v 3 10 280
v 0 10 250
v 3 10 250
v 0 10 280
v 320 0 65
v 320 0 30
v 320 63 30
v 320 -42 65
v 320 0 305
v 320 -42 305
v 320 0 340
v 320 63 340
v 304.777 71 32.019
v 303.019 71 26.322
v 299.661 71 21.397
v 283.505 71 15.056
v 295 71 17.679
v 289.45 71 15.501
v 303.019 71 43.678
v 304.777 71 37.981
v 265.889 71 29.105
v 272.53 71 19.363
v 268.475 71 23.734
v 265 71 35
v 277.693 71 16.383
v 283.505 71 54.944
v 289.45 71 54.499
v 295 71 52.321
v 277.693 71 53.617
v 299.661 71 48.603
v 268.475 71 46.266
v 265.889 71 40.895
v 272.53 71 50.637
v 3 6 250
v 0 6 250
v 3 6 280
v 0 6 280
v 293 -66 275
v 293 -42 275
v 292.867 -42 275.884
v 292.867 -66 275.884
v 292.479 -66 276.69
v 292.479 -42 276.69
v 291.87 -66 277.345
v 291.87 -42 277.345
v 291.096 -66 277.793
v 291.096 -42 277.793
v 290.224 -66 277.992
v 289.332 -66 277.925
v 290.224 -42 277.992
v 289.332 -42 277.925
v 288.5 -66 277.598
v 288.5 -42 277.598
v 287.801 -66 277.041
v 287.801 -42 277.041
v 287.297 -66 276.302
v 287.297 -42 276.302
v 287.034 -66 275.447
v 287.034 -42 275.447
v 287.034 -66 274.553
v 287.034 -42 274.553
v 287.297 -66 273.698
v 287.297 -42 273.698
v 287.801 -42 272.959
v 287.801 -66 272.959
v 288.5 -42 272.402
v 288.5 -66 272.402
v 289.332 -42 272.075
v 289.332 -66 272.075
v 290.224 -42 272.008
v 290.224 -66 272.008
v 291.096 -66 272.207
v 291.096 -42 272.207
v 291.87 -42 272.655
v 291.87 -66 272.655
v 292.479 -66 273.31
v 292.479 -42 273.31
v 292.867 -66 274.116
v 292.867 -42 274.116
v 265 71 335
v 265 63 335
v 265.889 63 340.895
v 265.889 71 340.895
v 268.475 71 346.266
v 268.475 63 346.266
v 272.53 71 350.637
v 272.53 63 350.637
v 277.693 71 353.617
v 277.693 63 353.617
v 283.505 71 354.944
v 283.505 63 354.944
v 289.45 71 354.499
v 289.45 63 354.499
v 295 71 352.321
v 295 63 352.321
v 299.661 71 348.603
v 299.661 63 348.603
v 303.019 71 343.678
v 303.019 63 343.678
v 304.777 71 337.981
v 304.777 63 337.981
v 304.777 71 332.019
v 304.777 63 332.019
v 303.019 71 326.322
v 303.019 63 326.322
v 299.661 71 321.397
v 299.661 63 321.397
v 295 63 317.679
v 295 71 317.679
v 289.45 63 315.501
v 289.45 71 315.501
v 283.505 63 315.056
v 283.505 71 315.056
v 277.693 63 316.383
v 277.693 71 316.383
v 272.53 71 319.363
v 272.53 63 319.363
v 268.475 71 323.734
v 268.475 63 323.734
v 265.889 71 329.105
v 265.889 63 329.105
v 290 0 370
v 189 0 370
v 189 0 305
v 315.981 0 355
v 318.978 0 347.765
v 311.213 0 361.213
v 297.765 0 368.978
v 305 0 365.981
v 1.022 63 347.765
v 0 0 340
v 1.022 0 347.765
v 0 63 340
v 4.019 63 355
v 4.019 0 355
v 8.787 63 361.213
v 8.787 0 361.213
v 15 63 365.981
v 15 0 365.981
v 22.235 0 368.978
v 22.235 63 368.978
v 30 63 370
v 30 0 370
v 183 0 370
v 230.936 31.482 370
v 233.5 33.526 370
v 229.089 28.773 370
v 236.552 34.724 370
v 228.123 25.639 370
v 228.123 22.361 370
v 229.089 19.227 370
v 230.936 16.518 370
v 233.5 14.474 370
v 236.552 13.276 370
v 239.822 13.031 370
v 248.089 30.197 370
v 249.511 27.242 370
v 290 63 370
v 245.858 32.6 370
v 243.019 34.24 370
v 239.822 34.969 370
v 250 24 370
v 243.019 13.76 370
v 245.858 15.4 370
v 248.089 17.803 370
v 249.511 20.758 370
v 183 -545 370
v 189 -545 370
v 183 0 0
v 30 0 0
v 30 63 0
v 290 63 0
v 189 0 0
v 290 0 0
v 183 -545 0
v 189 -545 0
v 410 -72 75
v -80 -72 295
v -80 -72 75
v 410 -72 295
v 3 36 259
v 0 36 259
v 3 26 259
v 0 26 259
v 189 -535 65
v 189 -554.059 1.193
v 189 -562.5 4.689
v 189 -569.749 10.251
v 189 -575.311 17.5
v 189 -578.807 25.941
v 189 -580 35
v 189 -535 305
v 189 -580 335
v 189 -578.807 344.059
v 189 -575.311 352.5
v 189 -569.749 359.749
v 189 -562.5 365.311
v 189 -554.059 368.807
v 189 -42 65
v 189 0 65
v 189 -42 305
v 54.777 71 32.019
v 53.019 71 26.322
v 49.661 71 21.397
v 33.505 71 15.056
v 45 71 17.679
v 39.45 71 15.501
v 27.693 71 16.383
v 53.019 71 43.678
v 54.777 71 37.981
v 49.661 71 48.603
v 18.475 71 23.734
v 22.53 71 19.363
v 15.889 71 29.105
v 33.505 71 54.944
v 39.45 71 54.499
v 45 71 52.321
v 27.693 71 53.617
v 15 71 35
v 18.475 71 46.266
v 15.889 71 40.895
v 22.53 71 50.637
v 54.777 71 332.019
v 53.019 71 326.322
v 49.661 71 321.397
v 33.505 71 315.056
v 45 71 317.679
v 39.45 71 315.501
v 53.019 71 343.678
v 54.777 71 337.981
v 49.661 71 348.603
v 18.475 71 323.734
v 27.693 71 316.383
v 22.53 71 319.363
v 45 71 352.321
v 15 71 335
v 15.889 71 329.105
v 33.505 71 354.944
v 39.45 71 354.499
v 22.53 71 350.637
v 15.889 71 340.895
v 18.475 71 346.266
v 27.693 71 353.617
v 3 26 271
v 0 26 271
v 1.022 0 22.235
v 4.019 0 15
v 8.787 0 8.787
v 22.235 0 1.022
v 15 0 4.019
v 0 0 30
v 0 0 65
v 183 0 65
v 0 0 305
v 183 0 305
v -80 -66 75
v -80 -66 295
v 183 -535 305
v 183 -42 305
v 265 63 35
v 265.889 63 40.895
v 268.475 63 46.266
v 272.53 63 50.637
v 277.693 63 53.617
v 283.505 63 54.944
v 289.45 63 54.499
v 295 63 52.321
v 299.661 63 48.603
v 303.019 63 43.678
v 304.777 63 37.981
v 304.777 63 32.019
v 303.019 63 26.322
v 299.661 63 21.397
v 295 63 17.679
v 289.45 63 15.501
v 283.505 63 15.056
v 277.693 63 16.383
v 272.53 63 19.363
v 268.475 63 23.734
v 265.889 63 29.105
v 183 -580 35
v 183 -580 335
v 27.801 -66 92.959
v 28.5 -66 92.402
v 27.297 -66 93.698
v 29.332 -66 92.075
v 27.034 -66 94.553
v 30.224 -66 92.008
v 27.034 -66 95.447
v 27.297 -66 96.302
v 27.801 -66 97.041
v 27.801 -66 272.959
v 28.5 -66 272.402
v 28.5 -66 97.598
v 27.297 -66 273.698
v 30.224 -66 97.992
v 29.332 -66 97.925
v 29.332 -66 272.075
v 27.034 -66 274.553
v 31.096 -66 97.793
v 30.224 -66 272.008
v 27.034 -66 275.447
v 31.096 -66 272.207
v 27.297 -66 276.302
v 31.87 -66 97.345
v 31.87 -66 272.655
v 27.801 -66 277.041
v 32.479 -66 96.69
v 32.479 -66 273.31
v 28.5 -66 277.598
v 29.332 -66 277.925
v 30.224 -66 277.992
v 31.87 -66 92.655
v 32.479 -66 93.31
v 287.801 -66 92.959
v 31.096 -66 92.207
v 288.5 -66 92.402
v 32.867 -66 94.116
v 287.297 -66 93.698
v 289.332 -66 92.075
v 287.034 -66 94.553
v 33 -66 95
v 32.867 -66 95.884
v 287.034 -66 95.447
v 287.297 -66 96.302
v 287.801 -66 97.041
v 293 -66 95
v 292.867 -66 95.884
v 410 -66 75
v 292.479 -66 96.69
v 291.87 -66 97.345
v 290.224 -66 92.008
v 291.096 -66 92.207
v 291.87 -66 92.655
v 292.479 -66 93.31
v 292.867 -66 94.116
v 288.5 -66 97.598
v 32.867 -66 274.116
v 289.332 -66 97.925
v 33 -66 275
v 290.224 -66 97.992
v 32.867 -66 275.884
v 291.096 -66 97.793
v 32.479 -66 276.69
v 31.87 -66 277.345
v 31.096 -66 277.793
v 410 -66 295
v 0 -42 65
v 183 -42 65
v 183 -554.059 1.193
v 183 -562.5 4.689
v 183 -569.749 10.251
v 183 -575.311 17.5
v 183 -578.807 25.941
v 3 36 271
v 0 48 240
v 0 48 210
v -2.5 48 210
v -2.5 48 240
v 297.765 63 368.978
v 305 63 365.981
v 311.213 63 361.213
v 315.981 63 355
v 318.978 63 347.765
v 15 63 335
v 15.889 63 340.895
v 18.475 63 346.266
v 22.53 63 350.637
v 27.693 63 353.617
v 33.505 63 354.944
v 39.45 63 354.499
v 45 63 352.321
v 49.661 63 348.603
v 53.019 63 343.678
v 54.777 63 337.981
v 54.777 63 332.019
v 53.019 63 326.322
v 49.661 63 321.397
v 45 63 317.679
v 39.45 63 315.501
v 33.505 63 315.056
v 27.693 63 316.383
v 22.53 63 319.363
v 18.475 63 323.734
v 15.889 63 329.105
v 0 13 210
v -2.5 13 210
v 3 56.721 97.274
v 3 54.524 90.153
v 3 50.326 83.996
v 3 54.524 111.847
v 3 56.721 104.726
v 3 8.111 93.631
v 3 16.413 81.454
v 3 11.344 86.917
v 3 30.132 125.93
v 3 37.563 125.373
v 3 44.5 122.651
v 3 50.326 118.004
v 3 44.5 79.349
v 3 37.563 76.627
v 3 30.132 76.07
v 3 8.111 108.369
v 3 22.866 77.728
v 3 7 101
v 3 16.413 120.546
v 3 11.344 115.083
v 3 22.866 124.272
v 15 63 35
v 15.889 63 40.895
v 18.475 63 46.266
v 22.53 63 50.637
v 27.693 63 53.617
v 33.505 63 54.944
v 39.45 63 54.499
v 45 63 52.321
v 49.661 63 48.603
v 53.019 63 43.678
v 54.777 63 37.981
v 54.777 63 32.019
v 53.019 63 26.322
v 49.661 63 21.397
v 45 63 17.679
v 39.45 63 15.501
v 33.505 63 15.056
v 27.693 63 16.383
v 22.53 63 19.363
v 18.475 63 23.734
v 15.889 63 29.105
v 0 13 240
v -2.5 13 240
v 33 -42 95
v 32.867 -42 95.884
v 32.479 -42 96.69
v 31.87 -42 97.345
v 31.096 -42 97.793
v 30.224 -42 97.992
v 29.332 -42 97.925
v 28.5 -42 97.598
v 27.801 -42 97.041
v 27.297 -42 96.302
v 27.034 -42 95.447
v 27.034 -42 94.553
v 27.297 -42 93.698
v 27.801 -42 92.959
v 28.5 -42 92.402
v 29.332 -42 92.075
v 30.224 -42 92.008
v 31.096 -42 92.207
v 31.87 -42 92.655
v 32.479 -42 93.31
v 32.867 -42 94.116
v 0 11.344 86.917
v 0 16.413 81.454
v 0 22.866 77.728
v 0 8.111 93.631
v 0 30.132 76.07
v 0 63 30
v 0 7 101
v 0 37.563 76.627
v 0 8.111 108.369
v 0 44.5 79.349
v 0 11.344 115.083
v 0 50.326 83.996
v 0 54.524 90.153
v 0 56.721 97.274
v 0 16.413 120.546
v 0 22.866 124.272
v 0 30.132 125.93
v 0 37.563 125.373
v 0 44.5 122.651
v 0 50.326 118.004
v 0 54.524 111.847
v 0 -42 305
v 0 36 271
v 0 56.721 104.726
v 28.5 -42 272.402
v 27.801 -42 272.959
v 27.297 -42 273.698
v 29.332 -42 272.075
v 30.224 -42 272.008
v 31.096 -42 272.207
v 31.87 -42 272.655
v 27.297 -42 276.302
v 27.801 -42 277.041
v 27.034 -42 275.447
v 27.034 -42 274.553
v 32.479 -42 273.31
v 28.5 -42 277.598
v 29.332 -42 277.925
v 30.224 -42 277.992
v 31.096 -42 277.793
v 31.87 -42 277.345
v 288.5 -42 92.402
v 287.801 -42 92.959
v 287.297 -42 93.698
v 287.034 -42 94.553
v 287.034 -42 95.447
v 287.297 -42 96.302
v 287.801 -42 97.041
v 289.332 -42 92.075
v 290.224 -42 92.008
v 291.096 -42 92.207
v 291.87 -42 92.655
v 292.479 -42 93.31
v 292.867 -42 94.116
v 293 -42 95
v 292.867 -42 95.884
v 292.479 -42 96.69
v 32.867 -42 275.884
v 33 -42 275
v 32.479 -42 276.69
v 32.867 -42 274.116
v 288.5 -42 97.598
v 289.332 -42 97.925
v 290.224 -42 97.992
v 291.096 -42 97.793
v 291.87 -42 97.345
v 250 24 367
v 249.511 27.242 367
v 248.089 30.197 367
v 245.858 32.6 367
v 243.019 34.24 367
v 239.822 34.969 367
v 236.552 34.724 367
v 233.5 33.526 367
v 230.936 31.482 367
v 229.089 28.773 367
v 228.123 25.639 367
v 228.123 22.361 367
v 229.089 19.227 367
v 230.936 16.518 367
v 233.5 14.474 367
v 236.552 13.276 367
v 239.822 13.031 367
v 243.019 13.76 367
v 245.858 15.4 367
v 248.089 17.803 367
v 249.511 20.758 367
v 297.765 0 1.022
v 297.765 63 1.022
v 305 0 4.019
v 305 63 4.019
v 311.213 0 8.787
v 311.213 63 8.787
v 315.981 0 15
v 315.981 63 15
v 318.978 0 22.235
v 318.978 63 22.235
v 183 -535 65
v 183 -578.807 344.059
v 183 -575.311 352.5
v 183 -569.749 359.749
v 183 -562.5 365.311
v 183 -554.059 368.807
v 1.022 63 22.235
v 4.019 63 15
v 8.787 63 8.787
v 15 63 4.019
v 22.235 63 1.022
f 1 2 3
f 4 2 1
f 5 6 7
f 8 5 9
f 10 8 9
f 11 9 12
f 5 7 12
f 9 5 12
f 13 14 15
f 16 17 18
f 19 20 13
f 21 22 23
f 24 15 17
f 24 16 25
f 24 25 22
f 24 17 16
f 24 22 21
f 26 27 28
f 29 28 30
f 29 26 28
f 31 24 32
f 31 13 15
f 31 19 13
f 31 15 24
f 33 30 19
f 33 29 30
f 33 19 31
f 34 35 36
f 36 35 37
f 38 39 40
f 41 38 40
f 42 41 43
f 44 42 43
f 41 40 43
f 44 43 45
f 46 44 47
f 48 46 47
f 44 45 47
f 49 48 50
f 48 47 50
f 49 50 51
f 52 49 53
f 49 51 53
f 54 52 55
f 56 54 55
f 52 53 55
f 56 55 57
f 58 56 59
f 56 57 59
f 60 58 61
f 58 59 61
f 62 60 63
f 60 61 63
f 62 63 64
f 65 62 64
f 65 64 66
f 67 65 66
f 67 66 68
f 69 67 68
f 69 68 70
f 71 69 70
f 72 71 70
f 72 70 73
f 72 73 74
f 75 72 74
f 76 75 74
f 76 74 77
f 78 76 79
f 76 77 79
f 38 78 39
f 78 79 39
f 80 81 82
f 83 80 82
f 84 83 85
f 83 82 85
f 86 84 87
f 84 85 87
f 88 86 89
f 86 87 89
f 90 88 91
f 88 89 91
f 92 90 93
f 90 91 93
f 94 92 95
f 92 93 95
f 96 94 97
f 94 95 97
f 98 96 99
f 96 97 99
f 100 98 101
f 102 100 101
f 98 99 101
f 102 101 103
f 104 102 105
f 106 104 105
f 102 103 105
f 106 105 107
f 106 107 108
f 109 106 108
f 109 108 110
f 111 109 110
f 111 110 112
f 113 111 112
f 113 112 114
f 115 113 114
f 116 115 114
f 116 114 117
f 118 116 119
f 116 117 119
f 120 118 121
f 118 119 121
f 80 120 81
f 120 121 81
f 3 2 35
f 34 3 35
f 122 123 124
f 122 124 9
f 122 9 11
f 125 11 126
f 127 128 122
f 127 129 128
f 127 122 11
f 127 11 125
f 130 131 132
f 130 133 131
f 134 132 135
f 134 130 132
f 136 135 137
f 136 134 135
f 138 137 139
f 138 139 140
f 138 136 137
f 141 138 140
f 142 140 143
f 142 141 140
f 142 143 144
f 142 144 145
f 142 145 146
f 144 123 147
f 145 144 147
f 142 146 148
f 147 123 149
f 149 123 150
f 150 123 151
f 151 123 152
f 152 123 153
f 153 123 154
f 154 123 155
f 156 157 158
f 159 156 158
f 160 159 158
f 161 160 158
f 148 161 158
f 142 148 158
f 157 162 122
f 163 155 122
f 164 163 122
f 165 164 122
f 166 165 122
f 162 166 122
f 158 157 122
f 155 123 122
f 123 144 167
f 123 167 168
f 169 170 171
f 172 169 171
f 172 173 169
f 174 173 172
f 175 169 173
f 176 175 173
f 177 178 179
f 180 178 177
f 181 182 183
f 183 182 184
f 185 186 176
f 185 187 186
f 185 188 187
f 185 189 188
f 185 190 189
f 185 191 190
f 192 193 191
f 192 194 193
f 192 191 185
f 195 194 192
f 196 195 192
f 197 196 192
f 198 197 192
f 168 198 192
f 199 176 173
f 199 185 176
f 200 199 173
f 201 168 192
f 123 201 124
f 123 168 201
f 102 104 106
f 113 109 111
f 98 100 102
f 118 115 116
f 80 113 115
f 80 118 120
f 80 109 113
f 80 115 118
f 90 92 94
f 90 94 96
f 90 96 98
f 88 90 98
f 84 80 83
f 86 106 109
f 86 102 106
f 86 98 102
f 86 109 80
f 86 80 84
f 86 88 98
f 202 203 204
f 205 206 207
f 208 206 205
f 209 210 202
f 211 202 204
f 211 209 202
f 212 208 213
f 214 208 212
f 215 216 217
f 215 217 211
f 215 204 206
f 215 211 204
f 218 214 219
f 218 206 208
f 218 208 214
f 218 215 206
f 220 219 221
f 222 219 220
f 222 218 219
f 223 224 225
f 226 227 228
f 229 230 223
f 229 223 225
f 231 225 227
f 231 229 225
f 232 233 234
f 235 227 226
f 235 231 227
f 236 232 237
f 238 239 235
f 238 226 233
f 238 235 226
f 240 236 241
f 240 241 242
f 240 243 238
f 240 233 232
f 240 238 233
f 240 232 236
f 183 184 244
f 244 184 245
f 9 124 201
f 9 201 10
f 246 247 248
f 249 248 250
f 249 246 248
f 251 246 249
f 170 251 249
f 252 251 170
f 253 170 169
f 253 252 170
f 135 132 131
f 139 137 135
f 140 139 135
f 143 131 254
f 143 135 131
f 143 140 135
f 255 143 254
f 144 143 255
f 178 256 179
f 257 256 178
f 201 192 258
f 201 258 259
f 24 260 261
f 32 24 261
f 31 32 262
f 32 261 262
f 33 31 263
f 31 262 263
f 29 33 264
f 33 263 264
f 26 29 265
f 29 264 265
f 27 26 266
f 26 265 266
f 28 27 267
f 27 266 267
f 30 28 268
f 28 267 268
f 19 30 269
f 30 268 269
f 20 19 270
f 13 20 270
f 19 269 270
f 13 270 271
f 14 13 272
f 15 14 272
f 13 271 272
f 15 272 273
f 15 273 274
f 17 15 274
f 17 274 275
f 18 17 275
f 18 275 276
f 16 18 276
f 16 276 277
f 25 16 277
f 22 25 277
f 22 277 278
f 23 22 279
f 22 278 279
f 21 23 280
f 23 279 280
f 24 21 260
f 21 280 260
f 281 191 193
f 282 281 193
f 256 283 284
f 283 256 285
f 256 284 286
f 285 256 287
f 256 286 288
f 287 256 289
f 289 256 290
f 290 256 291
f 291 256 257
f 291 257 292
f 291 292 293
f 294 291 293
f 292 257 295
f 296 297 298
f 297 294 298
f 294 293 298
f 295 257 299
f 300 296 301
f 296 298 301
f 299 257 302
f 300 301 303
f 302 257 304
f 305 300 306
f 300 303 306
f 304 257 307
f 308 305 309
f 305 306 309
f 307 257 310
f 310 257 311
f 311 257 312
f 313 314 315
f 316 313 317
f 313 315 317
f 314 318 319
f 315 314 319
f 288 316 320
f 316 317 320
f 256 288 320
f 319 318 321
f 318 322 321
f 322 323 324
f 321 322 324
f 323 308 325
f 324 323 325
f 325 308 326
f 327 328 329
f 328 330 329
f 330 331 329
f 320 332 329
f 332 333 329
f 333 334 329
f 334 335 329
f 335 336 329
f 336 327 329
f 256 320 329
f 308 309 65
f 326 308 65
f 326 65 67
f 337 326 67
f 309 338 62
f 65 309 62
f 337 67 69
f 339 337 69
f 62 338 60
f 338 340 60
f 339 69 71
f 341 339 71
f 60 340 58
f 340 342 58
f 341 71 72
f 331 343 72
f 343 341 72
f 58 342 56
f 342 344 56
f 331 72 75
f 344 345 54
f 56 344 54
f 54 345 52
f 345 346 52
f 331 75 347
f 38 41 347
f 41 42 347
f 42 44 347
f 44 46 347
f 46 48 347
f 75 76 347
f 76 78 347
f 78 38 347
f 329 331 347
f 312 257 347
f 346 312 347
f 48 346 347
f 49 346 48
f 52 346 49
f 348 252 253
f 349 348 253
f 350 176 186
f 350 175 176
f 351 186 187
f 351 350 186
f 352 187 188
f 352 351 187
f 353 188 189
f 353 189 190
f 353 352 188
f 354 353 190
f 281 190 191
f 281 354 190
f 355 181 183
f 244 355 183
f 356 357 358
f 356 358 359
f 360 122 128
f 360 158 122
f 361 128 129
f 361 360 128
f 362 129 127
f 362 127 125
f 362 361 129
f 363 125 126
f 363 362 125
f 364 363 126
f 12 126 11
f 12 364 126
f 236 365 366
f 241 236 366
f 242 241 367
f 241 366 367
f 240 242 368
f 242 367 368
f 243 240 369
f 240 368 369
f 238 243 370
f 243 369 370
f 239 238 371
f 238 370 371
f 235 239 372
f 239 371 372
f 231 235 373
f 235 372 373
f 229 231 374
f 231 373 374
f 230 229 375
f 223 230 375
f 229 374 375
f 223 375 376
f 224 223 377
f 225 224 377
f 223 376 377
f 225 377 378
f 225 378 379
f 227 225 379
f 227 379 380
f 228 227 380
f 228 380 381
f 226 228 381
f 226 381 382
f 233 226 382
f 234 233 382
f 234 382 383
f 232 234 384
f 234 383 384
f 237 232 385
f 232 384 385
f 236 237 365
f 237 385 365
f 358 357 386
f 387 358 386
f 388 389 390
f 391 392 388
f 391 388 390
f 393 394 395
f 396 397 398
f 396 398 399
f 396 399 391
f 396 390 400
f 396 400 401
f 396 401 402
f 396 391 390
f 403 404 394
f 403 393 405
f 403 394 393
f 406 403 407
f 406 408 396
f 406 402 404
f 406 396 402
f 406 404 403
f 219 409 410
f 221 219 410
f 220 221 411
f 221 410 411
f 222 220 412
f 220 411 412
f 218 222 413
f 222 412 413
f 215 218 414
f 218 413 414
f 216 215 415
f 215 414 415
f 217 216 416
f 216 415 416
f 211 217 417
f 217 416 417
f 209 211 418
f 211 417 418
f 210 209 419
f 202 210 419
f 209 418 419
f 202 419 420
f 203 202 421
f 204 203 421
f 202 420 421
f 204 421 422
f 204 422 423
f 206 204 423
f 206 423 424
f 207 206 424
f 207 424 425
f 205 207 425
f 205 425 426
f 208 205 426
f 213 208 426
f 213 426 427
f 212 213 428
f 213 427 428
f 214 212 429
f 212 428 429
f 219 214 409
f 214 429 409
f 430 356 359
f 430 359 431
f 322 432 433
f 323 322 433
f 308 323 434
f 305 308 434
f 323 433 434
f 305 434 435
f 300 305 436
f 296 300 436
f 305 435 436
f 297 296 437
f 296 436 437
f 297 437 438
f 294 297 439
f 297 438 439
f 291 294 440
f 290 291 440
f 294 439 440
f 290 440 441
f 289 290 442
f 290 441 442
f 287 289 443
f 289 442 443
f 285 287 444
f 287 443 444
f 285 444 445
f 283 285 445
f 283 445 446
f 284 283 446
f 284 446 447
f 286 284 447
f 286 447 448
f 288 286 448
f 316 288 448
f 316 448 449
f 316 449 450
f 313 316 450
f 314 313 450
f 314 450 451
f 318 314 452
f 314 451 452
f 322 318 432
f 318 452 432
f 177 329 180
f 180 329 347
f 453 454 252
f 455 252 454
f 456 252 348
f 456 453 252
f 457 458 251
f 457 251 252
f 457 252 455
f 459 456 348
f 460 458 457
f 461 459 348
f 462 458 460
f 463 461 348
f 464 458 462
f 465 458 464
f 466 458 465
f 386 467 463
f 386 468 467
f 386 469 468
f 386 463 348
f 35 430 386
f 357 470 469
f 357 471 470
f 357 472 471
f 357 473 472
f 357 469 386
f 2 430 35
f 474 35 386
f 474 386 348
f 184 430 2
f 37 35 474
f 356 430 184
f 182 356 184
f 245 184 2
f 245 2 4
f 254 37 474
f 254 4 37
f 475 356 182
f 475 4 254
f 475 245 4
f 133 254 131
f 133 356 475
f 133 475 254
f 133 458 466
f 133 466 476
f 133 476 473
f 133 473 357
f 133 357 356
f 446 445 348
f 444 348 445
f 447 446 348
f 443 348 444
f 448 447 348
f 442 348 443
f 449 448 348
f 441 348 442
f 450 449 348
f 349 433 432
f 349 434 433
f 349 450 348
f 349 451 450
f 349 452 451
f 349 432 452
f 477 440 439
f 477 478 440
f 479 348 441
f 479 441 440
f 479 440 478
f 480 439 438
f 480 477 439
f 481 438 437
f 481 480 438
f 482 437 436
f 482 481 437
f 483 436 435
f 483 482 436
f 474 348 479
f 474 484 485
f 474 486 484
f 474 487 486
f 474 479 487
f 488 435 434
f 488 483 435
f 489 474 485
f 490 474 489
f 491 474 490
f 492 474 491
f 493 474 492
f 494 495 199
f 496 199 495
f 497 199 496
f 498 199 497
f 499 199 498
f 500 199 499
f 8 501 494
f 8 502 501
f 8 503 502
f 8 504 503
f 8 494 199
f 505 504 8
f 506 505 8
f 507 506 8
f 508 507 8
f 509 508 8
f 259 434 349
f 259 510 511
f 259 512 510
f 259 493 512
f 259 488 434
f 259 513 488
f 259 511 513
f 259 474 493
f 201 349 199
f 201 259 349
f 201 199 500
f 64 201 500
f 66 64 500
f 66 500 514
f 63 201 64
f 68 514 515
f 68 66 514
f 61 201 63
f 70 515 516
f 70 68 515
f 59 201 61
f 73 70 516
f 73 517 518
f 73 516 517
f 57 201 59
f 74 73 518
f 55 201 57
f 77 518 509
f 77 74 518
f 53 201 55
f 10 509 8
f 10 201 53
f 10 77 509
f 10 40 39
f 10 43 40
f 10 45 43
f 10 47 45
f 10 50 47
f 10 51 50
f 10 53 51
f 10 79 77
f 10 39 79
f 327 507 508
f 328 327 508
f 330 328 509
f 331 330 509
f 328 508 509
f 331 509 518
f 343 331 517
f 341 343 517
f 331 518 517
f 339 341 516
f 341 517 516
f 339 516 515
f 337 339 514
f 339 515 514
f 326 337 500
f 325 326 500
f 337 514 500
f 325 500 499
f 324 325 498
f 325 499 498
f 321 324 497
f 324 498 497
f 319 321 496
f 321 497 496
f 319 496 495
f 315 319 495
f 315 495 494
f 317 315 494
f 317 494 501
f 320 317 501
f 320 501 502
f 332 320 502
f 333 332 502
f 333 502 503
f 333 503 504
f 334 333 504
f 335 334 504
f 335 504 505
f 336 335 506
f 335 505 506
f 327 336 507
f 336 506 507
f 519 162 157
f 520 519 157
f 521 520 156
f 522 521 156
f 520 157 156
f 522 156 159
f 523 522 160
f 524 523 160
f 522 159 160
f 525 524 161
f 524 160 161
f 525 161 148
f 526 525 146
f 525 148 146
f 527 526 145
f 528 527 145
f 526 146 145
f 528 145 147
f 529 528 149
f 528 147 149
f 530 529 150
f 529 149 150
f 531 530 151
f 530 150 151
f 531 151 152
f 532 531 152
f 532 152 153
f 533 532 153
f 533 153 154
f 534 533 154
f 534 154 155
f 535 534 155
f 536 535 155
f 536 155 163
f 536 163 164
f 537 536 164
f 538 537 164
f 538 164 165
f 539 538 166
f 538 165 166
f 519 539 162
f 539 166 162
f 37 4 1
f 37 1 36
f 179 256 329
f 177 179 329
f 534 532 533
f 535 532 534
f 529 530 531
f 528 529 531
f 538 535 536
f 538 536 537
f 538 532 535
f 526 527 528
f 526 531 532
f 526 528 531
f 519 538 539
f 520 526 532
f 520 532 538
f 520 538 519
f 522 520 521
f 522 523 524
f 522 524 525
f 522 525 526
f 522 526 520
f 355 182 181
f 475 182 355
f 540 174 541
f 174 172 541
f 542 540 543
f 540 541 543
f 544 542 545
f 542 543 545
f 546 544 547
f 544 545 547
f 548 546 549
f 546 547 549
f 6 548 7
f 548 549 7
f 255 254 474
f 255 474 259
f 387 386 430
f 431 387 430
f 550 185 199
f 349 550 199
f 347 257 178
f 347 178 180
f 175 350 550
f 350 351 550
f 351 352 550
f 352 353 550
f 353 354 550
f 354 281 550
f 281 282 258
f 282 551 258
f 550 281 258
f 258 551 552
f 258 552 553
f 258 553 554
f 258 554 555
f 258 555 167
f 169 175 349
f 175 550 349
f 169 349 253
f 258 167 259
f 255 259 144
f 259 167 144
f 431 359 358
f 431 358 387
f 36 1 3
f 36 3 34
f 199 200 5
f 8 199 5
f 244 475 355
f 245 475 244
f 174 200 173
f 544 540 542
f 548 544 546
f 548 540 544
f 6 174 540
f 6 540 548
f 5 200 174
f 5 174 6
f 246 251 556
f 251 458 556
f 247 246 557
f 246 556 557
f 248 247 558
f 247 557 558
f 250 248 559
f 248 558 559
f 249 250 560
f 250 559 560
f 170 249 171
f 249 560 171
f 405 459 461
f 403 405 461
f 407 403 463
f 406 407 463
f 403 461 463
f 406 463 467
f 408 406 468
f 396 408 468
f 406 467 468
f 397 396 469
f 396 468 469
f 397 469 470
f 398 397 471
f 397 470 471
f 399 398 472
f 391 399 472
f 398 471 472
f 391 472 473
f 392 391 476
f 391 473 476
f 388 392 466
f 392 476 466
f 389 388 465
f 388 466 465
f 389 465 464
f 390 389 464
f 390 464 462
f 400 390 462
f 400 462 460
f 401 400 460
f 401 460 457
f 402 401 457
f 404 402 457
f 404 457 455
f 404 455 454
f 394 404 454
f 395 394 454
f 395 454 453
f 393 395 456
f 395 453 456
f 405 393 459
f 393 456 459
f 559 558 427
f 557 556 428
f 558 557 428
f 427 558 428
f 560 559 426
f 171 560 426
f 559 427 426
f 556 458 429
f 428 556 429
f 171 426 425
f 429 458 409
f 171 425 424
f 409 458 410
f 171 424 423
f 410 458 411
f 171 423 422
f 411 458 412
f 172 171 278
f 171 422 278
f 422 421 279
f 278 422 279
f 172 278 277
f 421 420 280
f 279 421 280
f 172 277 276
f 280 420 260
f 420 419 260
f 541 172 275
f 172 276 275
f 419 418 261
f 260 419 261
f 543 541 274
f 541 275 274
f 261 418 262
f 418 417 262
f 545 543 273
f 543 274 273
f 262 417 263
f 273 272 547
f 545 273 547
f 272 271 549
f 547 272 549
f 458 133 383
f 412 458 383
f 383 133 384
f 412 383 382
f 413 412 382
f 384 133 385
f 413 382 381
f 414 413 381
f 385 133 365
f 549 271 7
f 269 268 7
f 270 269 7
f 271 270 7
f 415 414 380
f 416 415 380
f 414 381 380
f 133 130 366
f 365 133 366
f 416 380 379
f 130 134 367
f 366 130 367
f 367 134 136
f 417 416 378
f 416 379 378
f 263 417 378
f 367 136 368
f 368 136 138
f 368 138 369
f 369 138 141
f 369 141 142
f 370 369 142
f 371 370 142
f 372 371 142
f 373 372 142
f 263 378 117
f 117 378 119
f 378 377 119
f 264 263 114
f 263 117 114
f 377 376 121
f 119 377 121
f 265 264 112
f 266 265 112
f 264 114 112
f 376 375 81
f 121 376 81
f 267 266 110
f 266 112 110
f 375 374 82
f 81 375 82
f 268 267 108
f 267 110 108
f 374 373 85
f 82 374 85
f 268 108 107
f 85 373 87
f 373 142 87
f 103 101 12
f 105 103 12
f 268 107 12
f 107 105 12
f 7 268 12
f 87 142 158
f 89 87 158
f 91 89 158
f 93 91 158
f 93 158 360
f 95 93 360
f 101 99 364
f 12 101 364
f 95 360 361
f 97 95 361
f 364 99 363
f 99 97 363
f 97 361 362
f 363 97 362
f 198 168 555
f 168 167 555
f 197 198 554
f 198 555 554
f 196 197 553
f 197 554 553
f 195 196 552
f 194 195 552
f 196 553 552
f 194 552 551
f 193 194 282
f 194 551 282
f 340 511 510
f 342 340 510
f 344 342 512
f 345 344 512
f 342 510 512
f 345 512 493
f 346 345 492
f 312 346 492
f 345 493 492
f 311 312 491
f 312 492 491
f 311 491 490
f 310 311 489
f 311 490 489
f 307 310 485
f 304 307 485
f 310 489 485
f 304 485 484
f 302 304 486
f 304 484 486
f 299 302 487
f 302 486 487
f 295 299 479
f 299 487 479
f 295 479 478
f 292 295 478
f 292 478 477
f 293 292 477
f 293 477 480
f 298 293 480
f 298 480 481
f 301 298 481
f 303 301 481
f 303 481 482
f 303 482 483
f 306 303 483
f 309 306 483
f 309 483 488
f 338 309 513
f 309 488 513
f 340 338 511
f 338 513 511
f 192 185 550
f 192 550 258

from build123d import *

# Parameters (mm, degrees)
F0_W      = 320
F0_H      = 370
F1_DEPTH  = 63
F2_R      = 20
F3_DEPTH  = 8
F4_R      = 30
F6_W      = 580
F6_H      = 370
F7_DEPTH  = 6
F8_W      = 535
F8_H      = 240
F9_DEPTH  = 189.001
F10_R     = 35
F11_W     = 320
F11_H     = 240
F12_DEPTH = 42
F13_R     = 11
F14_DEPTH = 3
F15_R     = 25
F15_W     = 4
F15_H     = 30
F15_W_2   = 10
F15_H_2   = 12
F16_DEPTH = 3
F15_W_3   = 35
F17_DEPTH = 2.5
F18_R     = 3
F19_DEPTH = 24
F21_W     = 490
F21_H     = 220
F22_DEPTH = 6


with BuildPart() as f1:
    # F0 (on Front) → F1 (new body)
    with BuildSketch(Plane.XZ):
        with Locations((160, 185)):
            Rectangle(F0_W, F0_H)
    extrude(amount=-F1_DEPTH)

    # F2 (on face) → F3 (join)
    with BuildSketch(Plane(origin=(0, 63, 0), x_dir=(-1, 0, 0), z_dir=(0, 1, 0))):
        with Locations((-285, 35)):
            Circle(F2_R)
        with Locations((-285, 335)):
            Circle(F2_R)
        with Locations((-35, 335)):
            Circle(F2_R)
        with Locations((-35, 35)):
            Circle(F2_R)
    extrude(amount=F3_DEPTH)

    # F4
    f4_edges = [f1.edges().sort_by_distance(p)[0] for p in [
        (0, 31.5, 0),
        (320, 31.5, 0),
        (320, 31.5, 370),
        (0, 31.5, 370),
    ]]
    fillet(f4_edges, radius=F4_R)

    # F6 (on line) → F7 (join)
    with BuildSketch(Plane.YZ.offset(189)):
        with Locations((-290, 185)):
            Rectangle(F6_W, F6_H)
    extrude(amount=-F7_DEPTH)

    # F8 (on face) → F9 (cut, through all)
    with BuildSketch(Plane.YZ.offset(189)):
        with Locations((-267.5, 185)):
            Rectangle(F8_W, F8_H)
    extrude(amount=-F9_DEPTH, mode=Mode.SUBTRACT)

    # F10
    f10_edges = [f1.edges().sort_by_distance(p)[0] for p in [
        (186, -580, 0),
        (186, -580, 370),
    ]]
    fillet(f10_edges, radius=F10_R)

    # F11 (on face) → F12 (join)
    with BuildSketch(Plane.XZ):
        with Locations((160, 185)):
            Rectangle(F11_W, F11_H)
    extrude(amount=F12_DEPTH)

    # F13 (on face) → F14 (cut)
    with BuildSketch(Plane.XY.offset(370)):
        with Locations((239, 24)):
            Circle(F13_R)
    extrude(amount=-F14_DEPTH, mode=Mode.SUBTRACT)

    # F15 (on face) → F16 (cut)
    with BuildSketch(Plane(origin=(0, 0, 0), x_dir=(0, -1, 0), z_dir=(-1, 0, 0))):
        with Locations((-32, 101)):
            Circle(F15_R)
        with Locations((-8, 265)):
            Rectangle(F15_W, F15_H)
        with Locations((-31, 265)):
            Rectangle(F15_W_2, F15_H_2)
    extrude(amount=-F16_DEPTH, mode=Mode.SUBTRACT)

    # F15 (on face) → F17 (join)
    with BuildSketch(Plane(origin=(0, 0, 0), x_dir=(0, -1, 0), z_dir=(-1, 0, 0))):
        with Locations((-30.5, 225)):
            Rectangle(F15_W_3, F15_H)
    extrude(amount=F17_DEPTH)

    # F18 (on face) → F19 (join)
    with BuildSketch(Plane.XZ.offset(42)):
        with Locations((30, 95)):
            Circle(F18_R)
        with Locations((30, 275)):
            Circle(F18_R)
        with Locations((290, 95)):
            Circle(F18_R)
        with Locations((290, 275)):
            Circle(F18_R)
    extrude(amount=F19_DEPTH)

    # F21 (on offset) → F22 (join)
    with BuildSketch(Plane.XZ.offset(66)):
        with Locations((165, 185)):
            Rectangle(F21_W, F21_H)
    extrude(amount=F22_DEPTH)


solid = f1.part
